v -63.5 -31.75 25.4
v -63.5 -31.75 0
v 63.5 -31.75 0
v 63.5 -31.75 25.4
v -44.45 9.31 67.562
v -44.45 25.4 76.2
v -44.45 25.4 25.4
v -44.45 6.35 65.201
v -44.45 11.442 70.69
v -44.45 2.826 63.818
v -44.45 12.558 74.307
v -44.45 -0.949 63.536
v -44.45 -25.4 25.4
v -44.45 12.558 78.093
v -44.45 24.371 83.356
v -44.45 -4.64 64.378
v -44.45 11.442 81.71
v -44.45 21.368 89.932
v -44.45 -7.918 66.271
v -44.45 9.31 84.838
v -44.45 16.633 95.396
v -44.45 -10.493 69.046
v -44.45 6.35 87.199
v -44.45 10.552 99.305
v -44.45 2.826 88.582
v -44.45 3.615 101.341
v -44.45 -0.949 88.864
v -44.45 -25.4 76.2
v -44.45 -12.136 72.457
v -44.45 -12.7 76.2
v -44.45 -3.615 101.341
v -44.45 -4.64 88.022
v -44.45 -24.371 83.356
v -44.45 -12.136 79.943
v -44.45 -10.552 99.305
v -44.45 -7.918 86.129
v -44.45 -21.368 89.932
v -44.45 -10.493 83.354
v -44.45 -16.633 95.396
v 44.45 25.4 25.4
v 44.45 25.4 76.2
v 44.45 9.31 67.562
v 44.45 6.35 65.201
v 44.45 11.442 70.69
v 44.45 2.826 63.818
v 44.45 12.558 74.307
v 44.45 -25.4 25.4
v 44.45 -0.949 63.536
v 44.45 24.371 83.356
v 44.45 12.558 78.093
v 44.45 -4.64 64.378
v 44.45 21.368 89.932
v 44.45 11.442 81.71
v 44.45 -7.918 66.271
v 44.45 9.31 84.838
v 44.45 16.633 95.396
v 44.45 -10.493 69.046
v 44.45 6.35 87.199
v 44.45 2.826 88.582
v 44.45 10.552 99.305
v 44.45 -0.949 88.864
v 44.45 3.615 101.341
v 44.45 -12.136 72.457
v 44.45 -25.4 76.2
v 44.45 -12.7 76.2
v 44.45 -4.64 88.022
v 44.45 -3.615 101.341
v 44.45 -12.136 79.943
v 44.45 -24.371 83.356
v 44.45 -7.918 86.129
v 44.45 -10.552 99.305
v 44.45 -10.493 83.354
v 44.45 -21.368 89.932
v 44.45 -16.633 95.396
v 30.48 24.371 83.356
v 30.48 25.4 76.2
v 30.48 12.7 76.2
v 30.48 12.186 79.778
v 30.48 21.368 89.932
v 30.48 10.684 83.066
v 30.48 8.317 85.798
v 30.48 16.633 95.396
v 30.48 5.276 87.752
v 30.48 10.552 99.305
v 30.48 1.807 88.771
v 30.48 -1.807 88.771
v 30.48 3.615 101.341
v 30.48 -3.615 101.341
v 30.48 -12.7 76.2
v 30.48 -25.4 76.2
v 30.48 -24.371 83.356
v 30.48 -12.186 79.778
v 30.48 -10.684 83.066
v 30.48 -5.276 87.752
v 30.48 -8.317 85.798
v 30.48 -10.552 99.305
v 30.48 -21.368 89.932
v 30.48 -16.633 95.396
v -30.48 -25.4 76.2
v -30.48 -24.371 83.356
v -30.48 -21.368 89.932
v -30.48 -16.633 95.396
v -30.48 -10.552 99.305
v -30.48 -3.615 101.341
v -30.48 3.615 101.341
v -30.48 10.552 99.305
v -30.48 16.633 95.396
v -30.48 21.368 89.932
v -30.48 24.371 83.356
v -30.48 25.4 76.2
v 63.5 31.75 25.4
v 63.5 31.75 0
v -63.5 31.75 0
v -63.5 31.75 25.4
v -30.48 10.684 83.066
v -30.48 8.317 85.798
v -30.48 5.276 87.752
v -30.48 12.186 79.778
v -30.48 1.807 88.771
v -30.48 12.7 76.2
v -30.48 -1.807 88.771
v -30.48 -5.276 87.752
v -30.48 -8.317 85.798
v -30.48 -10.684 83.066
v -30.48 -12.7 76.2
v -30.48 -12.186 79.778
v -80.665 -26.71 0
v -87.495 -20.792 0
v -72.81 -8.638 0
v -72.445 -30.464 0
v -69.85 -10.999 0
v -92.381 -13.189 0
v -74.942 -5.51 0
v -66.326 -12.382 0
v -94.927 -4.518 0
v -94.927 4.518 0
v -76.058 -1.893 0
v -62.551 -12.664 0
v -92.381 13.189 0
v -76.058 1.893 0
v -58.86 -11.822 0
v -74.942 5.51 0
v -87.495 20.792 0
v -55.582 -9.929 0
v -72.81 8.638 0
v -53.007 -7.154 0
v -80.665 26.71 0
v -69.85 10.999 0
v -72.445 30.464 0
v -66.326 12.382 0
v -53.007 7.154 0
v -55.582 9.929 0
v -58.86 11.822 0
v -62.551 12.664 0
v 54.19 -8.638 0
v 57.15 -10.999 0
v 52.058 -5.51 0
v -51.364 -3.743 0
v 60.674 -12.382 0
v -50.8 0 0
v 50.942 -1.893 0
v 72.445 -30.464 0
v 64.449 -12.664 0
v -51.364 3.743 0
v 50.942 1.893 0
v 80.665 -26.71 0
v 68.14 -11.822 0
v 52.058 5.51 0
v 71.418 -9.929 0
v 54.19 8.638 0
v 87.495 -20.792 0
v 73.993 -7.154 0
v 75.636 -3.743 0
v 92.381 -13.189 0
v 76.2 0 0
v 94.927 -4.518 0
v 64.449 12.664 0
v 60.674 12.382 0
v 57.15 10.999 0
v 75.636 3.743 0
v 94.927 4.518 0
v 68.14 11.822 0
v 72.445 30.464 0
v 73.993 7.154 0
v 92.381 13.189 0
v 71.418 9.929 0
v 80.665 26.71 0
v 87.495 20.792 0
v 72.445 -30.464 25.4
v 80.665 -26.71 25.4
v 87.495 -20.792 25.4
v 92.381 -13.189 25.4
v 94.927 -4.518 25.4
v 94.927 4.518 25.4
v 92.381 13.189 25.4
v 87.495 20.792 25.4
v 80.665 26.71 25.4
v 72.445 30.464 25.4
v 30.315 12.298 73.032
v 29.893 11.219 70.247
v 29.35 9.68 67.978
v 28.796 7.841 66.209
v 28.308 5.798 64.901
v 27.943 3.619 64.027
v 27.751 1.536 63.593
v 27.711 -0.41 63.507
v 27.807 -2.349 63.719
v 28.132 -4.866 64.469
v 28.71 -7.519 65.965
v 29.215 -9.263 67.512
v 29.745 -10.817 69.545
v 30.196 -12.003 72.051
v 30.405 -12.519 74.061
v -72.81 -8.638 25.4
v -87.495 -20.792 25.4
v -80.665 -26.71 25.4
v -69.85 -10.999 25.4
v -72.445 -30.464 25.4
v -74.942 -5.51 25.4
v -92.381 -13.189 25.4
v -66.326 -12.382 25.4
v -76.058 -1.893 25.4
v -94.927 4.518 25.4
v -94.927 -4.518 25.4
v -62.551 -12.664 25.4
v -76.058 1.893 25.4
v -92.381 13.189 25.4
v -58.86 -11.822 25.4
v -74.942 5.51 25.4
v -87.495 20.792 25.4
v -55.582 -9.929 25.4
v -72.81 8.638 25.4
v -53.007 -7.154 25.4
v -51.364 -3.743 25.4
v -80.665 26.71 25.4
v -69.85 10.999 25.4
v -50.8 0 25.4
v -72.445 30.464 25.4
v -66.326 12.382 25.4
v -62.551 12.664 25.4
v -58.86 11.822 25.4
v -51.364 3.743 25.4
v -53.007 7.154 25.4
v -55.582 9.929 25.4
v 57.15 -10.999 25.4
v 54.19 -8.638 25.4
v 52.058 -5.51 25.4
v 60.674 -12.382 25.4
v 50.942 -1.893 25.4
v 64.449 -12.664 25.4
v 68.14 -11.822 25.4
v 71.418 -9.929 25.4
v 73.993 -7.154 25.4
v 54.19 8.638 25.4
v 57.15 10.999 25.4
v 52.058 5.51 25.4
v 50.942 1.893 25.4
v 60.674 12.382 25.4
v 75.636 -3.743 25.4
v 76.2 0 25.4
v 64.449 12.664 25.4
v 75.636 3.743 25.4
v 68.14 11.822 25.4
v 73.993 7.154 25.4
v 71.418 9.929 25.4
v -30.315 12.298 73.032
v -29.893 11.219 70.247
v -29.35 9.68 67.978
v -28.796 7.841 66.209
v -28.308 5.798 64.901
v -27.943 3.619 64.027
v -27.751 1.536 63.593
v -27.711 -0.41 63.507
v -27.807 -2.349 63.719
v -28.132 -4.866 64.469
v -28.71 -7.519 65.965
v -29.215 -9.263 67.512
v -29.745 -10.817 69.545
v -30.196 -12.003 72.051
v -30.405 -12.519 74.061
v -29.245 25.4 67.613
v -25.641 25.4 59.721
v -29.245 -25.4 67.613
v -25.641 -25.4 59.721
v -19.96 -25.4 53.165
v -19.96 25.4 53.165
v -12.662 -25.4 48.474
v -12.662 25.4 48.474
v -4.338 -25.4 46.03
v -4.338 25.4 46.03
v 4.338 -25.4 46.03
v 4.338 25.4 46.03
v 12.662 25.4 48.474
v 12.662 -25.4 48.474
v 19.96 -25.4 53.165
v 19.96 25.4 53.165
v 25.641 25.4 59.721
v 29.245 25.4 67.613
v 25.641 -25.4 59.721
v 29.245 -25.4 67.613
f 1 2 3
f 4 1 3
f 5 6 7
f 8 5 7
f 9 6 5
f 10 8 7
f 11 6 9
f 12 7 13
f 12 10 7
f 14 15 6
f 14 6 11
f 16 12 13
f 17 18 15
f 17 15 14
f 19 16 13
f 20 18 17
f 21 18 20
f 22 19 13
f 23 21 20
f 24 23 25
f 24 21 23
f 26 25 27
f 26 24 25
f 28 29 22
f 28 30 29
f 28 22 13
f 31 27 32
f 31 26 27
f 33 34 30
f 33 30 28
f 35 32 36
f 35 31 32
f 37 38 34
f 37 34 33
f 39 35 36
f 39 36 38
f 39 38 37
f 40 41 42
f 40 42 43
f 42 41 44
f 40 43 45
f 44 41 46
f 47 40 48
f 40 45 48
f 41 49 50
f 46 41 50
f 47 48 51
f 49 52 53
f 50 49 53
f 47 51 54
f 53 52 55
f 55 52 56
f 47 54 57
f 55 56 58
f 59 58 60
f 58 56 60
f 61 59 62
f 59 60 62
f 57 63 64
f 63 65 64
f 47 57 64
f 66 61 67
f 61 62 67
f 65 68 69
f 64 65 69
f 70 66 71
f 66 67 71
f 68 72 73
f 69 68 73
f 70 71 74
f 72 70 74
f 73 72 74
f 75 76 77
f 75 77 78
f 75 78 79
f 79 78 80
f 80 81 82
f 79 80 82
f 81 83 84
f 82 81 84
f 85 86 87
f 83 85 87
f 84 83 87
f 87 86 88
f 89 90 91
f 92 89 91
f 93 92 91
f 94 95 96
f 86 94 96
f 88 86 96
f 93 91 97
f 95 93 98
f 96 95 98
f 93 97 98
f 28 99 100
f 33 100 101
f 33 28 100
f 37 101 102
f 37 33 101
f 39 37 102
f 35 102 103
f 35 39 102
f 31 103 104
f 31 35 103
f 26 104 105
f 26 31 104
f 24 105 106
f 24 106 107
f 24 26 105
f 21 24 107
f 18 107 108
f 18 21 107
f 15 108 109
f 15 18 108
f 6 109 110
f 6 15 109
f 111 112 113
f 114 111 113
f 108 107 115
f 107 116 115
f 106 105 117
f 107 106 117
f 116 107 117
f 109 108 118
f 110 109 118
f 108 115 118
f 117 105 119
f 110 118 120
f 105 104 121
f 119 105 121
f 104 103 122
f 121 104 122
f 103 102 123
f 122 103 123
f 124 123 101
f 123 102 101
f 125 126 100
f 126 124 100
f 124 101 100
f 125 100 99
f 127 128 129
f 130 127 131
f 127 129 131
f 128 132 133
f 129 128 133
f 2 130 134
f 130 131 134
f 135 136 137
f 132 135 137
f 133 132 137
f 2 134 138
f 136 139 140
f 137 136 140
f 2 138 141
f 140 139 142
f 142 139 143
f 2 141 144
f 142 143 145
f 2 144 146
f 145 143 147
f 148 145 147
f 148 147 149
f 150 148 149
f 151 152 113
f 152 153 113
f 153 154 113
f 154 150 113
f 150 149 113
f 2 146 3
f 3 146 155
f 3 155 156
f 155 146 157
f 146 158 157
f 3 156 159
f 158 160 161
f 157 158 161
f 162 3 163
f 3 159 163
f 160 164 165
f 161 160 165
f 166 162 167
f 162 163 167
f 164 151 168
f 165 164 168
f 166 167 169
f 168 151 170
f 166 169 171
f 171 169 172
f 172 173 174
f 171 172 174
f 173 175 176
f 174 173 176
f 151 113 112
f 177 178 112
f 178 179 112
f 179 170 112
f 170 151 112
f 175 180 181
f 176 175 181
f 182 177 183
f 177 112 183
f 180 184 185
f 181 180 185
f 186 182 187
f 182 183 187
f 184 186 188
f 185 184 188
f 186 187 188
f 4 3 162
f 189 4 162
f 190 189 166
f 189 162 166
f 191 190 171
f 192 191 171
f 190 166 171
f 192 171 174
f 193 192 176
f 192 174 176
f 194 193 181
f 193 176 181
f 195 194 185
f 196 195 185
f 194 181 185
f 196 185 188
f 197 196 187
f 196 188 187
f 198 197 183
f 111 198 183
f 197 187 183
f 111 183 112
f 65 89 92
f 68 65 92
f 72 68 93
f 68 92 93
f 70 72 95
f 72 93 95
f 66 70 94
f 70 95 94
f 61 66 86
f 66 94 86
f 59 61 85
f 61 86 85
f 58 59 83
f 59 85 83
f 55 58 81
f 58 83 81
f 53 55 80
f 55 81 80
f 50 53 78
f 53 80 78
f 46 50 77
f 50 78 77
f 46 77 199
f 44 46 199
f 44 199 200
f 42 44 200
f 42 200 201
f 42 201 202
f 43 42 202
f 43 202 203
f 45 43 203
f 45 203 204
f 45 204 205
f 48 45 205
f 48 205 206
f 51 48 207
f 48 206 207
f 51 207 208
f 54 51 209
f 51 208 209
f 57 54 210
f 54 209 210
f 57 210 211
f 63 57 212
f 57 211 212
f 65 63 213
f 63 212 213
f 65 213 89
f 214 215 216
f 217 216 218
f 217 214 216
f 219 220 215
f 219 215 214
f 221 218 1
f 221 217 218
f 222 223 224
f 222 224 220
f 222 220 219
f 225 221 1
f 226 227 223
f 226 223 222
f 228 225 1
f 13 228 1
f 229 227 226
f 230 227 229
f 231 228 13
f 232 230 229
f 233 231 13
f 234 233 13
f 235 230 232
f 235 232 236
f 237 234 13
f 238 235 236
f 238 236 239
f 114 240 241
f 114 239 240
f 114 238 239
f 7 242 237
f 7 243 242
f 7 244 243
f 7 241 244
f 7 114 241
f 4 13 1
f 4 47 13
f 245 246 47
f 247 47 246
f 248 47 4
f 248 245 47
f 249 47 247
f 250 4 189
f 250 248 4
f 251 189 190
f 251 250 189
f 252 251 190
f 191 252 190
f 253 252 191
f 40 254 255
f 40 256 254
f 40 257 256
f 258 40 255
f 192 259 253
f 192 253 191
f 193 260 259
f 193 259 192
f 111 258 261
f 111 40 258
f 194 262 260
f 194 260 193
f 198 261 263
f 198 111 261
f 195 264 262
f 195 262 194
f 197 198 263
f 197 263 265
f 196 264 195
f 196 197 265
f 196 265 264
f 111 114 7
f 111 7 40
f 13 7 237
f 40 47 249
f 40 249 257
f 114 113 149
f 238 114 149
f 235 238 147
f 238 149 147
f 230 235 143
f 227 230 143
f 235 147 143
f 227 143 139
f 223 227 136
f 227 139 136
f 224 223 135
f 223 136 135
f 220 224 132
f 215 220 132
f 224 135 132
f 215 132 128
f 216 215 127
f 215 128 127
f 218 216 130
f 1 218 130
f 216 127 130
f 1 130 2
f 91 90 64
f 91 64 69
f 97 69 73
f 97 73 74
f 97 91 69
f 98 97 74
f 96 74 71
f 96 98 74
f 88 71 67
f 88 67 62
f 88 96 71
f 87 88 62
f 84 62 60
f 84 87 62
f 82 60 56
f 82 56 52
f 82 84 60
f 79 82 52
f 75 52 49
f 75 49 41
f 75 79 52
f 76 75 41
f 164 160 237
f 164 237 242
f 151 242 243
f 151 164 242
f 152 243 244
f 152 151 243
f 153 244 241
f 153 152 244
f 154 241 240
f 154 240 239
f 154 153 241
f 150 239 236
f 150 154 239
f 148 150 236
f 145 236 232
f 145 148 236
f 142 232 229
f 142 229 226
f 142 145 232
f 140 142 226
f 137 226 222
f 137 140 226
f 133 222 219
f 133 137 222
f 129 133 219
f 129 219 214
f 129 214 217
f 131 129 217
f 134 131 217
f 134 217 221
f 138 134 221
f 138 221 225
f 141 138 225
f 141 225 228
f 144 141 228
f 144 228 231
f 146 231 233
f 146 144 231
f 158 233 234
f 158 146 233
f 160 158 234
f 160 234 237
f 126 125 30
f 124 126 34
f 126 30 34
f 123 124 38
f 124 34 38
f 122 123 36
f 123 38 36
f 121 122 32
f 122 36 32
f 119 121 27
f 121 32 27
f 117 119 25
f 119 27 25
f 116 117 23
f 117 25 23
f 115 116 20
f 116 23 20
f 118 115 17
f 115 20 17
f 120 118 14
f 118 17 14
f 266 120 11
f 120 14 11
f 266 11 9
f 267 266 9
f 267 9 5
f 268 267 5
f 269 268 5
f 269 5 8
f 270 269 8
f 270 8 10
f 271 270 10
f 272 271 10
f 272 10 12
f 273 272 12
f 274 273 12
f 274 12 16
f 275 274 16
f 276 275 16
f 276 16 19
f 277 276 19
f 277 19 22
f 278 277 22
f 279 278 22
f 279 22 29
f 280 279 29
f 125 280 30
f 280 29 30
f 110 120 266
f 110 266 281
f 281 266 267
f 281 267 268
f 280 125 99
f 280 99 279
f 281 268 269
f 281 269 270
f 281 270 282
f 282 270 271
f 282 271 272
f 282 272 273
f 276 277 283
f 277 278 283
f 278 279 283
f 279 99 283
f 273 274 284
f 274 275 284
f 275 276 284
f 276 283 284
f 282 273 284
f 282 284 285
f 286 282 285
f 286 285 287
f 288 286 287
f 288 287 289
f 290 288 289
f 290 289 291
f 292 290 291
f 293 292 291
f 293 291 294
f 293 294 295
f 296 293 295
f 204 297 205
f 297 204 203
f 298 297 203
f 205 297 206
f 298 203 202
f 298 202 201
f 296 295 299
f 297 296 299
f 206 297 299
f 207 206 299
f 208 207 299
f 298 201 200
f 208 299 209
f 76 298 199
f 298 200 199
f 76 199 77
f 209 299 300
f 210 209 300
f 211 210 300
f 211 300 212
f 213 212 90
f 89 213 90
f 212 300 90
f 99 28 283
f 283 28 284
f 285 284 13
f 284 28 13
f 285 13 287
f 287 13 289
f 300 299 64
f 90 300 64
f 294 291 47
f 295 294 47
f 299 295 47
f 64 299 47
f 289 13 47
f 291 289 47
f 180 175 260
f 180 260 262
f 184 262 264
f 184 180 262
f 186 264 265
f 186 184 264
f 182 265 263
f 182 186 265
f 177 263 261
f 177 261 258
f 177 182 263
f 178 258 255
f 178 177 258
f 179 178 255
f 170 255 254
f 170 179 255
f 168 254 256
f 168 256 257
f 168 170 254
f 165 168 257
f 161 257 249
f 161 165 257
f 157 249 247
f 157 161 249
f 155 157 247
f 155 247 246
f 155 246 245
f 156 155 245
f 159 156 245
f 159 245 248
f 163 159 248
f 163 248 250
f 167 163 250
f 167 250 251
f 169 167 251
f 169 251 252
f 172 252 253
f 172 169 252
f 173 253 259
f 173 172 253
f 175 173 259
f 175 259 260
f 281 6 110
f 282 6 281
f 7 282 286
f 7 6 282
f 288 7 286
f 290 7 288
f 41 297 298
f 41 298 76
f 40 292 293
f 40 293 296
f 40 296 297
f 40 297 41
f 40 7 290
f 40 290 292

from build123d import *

# Parameters (mm, degrees)
F0_R     = 12.7
F1_DEPTH = 25.4
F2_W     = 88.9
F2_H     = 50.8
F3_DEPTH = 50.8
F5_DEPTH = 88.9
F7_DEPTH = 75.946
F8_R     = 12.7
F9_DEPTH = 112.776


# Not quite as in the source:
# - a feature names something its author has since deleted; it is built from what else it names


with BuildPart() as f1:
    # F0 (on Top) → F1 (new body)
    with BuildSketch(Plane.XY):
        with BuildLine():
            Line((-63.5, -31.75), (63.5, -31.75))
            ThreePointArc((63.5, -31.75), (95.25, 0), (63.5, 31.75))
            Line((63.5, 31.75), (-63.5, 31.75))
            ThreePointArc((-63.5, 31.75), (-95.25, 0), (-63.5, -31.75))
        make_face()
        with Locations((-63.5, 0)):
            Circle(F0_R, mode=Mode.SUBTRACT)
        with Locations((63.5, 0)):
            Circle(F0_R, mode=Mode.SUBTRACT)
    extrude(amount=F1_DEPTH)

    # F2 (on face) → F3 (join)
    with BuildSketch(Plane.XY.offset(25.4)):
        Rectangle(F2_W, F2_H)
    extrude(amount=F3_DEPTH)

    # F4 (on face) → F5 (join)
    with BuildSketch(Plane(origin=(-44.45, 0, 0), x_dir=(0, -1, 0), z_dir=(-1, 0, 0))):
        with BuildLine():
            Line((-25.4, 76.2), (25.4, 76.2))
            ThreePointArc((25.4, 76.2), (0, 101.6), (-25.4, 76.2))
        make_face()
    extrude(amount=-F5_DEPTH)

    # F6 (on face) → F7 (cut)
    with BuildSketch(Plane.XZ.offset(25.4)):
        with BuildLine():
            Line((-30.48, 76.2), (30.48, 76.2))
            ThreePointArc((30.48, 76.2), (0, 106.68), (-30.48, 76.2))
        make_face()
        with BuildLine():
            ThreePointArc((-30.48, 76.2), (0, 45.72), (30.48, 76.2))
            Line((30.48, 76.2), (-30.48, 76.2))
        make_face()
        with BuildLine():
            Line((30.48, 76.2), (30.48, 114.3))
            Line((30.48, 114.3), (-30.48, 114.3))
            Line((-30.48, 114.3), (-30.48, 76.2))
            ThreePointArc((-30.48, 76.2), (0, 106.68), (30.48, 76.2))
        make_face()
    extrude(amount=-F7_DEPTH, mode=Mode.SUBTRACT)

    # F8 (on face) → F9 (cut)
    with BuildSketch(Plane(origin=(-44.45, 0, 0), x_dir=(0, -1, 0), z_dir=(-1, 0, 0))):
        with Locations((0, 76.2)):
            Circle(F8_R)
    extrude(amount=-F9_DEPTH, mode=Mode.SUBTRACT)


solid = f1.part
